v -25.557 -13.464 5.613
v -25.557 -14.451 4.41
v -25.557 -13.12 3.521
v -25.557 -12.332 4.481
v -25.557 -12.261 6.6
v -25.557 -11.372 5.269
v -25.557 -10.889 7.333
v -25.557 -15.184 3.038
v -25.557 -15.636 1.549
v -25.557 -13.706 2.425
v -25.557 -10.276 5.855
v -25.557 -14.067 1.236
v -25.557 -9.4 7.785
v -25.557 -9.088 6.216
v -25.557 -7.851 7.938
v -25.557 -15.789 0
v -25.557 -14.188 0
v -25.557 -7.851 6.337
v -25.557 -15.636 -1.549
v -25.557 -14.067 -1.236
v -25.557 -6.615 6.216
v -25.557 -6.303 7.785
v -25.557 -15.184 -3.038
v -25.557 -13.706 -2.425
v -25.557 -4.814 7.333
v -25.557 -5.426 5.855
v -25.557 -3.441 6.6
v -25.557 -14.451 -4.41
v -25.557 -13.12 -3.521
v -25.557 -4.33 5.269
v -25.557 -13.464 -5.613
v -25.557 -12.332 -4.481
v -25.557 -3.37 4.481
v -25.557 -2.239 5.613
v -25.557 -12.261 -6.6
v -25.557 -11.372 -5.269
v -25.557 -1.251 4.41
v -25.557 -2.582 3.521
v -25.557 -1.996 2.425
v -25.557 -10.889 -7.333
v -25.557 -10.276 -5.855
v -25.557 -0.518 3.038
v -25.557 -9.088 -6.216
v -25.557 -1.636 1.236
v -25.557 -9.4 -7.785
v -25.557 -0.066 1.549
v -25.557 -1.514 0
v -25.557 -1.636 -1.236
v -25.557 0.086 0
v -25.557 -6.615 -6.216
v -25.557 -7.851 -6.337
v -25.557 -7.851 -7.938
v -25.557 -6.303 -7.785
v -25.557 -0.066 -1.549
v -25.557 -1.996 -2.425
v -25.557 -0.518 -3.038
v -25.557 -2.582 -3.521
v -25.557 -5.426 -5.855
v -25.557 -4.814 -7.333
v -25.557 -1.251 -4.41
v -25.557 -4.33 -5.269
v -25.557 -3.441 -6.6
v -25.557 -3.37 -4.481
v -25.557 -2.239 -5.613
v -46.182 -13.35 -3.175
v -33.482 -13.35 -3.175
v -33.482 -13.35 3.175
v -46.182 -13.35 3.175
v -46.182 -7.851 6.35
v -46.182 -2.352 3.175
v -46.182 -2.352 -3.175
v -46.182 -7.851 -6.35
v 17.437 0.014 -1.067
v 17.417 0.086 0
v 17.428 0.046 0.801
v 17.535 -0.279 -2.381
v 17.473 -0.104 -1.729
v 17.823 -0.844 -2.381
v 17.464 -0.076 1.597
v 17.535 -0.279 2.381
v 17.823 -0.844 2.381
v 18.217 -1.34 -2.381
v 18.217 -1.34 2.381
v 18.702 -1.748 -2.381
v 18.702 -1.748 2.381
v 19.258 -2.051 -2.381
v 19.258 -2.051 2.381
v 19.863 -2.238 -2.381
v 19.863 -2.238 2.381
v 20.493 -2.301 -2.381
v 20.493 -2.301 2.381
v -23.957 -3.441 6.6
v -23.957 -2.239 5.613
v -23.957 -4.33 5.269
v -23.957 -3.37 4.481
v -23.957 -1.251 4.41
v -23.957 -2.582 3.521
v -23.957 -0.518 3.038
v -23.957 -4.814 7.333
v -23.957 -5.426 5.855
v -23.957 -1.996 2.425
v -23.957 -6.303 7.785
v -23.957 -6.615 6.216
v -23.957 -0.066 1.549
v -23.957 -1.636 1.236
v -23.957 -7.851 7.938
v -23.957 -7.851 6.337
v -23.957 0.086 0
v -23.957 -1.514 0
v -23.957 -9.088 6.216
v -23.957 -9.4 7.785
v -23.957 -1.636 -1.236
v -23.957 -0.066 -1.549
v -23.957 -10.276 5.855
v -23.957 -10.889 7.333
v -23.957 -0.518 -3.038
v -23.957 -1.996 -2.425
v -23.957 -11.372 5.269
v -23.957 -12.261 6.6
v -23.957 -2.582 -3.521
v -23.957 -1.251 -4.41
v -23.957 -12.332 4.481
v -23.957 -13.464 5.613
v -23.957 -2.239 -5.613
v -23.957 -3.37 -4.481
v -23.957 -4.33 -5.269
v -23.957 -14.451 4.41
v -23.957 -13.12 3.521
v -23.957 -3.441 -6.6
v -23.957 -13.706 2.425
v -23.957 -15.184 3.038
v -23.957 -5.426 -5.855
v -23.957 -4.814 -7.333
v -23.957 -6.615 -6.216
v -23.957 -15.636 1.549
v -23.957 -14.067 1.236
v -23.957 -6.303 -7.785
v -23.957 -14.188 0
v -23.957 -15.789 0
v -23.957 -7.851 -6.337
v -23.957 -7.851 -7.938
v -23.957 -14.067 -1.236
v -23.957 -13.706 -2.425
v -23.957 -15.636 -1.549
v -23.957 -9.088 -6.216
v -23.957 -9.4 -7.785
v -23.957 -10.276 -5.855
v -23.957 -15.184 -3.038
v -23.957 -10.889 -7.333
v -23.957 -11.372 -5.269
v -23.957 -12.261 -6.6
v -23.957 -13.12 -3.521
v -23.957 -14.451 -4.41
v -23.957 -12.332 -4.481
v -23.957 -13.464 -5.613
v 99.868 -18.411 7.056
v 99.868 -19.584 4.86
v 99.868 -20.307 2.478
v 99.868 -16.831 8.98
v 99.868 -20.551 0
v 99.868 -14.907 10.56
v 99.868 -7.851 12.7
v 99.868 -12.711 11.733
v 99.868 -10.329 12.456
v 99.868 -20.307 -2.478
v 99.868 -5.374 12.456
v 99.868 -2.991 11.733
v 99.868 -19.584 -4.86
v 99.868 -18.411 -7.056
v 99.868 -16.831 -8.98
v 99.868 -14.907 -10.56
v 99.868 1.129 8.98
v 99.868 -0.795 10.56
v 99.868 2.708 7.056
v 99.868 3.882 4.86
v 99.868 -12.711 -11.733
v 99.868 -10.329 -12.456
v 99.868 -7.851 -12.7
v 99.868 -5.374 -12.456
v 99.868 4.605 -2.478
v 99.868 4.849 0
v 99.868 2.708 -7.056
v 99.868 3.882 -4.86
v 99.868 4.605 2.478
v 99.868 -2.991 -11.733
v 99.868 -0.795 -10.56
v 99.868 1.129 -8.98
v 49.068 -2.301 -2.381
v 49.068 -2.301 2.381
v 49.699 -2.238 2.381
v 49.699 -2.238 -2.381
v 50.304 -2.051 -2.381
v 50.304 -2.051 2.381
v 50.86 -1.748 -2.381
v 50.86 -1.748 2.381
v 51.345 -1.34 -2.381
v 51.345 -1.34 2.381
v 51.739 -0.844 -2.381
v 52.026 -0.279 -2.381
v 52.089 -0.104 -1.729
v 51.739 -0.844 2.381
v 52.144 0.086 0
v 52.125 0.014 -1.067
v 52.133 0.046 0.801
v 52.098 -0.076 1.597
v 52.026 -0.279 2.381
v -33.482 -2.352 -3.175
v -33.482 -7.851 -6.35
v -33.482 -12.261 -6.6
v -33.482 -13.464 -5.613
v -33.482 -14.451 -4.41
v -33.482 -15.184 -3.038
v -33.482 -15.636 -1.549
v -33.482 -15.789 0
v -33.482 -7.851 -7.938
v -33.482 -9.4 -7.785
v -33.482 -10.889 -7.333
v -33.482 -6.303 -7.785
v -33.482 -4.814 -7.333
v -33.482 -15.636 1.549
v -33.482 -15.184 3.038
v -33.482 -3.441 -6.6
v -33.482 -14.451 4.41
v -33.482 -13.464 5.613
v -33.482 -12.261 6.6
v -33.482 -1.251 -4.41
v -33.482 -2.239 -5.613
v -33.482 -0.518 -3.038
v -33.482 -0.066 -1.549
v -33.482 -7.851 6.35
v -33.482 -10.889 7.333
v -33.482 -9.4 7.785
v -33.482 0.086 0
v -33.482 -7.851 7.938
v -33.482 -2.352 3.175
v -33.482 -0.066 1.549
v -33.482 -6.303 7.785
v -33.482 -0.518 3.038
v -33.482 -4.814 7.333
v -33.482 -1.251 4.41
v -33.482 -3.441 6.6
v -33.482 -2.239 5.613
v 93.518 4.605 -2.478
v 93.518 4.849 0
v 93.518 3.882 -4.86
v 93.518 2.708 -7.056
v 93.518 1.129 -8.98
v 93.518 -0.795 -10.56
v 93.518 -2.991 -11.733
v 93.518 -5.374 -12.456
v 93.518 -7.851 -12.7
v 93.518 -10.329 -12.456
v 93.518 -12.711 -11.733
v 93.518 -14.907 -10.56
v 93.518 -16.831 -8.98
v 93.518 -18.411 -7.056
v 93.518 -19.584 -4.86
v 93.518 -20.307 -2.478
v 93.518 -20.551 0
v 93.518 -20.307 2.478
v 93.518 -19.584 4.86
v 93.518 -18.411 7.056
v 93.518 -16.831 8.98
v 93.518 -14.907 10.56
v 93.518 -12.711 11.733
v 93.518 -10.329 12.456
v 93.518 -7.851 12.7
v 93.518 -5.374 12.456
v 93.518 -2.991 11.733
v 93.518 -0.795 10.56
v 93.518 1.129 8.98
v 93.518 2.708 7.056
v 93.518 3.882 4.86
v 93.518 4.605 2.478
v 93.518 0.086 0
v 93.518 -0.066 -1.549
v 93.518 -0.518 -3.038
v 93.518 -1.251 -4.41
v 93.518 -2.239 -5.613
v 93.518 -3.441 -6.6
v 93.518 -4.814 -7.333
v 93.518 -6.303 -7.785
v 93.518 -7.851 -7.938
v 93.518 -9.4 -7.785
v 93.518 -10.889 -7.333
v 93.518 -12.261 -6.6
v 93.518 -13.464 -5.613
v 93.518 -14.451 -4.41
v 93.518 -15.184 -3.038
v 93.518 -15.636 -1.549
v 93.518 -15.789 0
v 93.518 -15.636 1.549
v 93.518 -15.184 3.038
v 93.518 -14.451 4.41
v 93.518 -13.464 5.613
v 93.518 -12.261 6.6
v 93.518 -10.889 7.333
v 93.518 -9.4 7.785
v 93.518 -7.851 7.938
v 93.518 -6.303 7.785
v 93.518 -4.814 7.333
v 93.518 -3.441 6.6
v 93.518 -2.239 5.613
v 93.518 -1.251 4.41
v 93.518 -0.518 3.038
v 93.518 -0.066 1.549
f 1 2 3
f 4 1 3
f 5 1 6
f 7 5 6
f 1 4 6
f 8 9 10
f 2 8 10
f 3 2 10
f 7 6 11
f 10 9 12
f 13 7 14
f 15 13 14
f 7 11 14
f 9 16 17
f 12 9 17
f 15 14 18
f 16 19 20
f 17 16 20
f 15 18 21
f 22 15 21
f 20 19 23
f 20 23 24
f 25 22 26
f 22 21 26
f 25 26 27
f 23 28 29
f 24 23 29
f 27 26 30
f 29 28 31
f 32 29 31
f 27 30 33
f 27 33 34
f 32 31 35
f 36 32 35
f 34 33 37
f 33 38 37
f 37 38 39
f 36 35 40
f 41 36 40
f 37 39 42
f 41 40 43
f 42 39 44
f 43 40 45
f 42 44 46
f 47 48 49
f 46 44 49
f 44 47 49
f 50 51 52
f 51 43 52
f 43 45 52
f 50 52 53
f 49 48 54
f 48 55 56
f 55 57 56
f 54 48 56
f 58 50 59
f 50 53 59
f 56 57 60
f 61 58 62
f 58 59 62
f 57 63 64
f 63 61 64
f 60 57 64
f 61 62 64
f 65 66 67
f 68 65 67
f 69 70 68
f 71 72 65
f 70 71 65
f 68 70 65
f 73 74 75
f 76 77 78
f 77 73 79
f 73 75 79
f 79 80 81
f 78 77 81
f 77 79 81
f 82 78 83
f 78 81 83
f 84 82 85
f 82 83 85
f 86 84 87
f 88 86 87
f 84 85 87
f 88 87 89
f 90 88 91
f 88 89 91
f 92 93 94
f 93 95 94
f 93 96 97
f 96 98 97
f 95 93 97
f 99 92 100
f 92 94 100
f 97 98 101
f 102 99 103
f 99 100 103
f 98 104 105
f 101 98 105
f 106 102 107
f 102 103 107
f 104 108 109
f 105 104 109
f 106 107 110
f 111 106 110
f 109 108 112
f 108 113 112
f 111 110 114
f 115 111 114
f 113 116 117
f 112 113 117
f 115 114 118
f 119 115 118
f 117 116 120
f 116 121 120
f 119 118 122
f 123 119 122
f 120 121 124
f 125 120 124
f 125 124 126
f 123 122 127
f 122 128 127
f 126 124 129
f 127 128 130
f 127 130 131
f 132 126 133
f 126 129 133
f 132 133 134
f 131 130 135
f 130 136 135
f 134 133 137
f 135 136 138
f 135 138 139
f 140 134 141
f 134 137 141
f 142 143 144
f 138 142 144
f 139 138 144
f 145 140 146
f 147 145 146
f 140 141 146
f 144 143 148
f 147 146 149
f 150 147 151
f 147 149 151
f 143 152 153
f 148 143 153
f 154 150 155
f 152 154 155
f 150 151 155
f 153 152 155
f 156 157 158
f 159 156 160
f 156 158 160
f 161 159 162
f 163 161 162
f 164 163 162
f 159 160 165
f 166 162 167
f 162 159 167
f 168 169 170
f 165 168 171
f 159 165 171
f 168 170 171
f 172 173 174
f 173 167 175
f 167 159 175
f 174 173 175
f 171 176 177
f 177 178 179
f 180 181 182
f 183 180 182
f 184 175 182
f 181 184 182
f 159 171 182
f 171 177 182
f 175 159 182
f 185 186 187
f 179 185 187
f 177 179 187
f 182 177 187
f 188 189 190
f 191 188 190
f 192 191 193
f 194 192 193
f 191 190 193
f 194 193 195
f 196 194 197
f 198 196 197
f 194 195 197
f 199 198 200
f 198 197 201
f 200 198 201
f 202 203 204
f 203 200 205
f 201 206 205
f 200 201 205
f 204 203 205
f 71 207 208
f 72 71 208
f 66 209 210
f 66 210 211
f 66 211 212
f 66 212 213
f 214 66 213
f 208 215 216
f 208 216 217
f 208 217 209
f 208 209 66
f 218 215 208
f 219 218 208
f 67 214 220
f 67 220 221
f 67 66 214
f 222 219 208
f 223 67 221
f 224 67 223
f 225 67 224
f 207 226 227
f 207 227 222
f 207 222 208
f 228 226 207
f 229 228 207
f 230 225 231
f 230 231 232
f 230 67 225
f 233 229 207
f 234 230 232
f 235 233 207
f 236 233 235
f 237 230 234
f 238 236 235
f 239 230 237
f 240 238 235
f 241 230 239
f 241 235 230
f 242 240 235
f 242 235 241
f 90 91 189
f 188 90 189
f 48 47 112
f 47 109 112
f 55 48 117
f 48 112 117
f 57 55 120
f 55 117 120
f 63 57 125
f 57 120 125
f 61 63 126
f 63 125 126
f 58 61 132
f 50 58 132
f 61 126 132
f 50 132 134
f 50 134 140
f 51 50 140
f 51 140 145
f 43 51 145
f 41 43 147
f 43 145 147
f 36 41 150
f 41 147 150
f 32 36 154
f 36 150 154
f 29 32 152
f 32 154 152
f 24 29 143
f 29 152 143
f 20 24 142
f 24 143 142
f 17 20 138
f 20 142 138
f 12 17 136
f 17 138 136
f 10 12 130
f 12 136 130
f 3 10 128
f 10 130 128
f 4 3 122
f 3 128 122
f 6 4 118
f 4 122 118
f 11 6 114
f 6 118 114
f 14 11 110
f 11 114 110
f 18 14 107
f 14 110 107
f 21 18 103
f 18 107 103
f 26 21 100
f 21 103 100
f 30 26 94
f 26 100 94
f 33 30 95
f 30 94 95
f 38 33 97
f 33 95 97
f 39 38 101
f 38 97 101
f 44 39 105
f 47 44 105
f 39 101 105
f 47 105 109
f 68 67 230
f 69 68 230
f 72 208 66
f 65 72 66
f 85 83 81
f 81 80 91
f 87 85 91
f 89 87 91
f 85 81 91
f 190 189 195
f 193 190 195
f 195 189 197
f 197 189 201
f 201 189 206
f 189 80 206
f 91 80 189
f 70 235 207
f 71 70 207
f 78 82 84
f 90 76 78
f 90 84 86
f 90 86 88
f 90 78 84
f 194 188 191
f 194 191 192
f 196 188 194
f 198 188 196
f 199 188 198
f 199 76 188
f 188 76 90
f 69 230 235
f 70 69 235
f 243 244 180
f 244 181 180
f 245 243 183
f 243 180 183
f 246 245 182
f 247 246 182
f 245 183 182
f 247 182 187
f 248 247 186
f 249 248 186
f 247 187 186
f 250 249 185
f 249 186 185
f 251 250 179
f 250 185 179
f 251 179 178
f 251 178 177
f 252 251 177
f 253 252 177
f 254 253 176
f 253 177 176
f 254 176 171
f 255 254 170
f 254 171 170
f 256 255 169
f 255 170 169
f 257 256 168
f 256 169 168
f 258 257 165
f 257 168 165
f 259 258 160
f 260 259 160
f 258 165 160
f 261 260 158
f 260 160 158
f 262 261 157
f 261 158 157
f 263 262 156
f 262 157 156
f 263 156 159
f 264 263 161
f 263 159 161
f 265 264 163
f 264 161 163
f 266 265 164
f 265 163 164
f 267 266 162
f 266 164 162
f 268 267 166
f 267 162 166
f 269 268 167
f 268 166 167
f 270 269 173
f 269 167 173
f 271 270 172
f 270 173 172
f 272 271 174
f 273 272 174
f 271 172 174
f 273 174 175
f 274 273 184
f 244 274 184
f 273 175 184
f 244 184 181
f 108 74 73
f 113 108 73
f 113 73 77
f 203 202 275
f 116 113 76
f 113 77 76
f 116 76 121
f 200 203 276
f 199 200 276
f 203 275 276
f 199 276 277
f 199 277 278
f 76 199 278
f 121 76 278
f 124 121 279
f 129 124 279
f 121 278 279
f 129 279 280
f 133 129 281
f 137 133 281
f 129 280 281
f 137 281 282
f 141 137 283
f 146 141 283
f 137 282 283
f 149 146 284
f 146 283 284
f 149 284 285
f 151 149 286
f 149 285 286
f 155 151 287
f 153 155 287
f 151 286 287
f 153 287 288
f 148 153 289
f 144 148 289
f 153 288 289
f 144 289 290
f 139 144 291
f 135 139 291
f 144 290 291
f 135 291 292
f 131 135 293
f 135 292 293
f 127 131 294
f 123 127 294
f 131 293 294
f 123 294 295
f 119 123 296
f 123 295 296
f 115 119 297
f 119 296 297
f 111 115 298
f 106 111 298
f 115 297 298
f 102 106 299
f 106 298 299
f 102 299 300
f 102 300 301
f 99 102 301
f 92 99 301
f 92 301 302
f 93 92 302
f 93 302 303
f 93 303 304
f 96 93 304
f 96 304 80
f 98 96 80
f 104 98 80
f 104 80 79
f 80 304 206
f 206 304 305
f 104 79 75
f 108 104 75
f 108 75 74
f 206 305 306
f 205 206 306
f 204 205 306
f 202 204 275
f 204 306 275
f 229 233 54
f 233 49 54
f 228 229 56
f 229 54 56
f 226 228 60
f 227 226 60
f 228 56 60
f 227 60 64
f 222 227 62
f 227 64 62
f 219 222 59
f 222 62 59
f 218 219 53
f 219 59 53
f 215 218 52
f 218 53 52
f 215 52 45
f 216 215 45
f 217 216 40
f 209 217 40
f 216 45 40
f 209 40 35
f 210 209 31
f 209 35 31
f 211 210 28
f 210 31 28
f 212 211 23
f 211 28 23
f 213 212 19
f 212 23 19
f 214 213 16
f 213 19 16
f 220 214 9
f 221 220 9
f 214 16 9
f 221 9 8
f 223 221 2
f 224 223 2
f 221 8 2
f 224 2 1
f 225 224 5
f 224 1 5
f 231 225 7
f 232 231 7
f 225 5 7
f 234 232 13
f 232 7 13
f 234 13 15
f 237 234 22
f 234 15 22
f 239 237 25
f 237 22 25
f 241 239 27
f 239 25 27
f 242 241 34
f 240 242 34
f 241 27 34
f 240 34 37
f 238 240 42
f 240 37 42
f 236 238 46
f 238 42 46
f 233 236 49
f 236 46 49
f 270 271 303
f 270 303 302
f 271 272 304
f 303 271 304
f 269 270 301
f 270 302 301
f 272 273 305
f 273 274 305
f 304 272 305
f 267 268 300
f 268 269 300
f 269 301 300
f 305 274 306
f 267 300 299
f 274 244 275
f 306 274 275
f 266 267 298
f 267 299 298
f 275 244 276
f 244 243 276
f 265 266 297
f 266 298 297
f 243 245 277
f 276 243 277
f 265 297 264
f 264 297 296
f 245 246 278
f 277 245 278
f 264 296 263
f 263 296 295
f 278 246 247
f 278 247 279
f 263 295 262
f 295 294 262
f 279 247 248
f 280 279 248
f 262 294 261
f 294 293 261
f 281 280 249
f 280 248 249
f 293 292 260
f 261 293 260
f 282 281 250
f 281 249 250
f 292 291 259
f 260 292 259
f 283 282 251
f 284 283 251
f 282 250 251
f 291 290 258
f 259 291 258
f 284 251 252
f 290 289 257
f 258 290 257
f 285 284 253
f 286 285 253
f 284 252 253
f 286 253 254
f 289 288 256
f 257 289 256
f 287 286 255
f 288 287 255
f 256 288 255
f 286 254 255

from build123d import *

# Parameters (mm, degrees)
CUT_EXTRUDE1_DEPTH = 2.38125
SKETCH3_OUTSIDE_W  = 57.48
SKETCH3_OUTSIDE_H  = 57.48
CUT_EXTRUDE2_DEPTH = 12.7


with BuildPart() as part:
    # Sketch1 → Revolve1 (revolve)
    with BuildSketch(Plane.XY):
        Polygon((-46.181818182, -7.851196491), (-46.181818182, -1.501196491), (-33.481818182, -1.501196491), (-33.481818182, 0.086303509), (-25.557018182, 0.086303509), (-25.557018182, -1.513896491), (-23.956818182, -1.513896491), (-23.956818182, 0.086303509), (93.518181818, 0.086303509), (93.518181818, 4.848803509), (99.868181818, 4.848803509), (99.868181818, -7.851196491), align=None)
    revolve(axis=Axis((-46.181818182, -7.851196491, 0), (-1, 0, 0)))

    # Sketch2 → Cut-Extrude1 (cut, symmetric)
    with BuildSketch(Plane.XY):
        with BuildLine():
            Line((17.318181818, 5.781363923), (17.318181818, 0.873703509))
            ThreePointArc((17.318181818, 0.873703509), (18.248117788, -1.371360522), (20.493181818, -2.301296491))
            Line((20.493181818, -2.301296491), (49.068181818, -2.301296491))
            ThreePointArc((49.068181818, -2.301296491), (51.313245848, -1.371360522), (52.243181818, 0.873703509))
            Line((52.243181818, 0.873703509), (52.243181818, 5.781363923))
            Line((52.243181818, 5.781363923), (17.318181818, 5.781363923))
        make_face()
    extrude(amount=CUT_EXTRUDE1_DEPTH, both=True, mode=Mode.SUBTRACT)

    # Sketch3 outside → Cut-Extrude2 (cut)
    with BuildSketch(Plane.ZY.offset(46.181818182)):
        with Locations((0, -7.851)):
            Rectangle(SKETCH3_OUTSIDE_W, SKETCH3_OUTSIDE_H)
        Polygon((6.35, -7.851196491), (3.175, -2.351935177), (-3.175, -2.351935177), (-6.35, -7.851196491), (-3.175, -13.350457805), (3.175, -13.350457805), align=None, mode=Mode.SUBTRACT)
    extrude(amount=-CUT_EXTRUDE2_DEPTH, mode=Mode.SUBTRACT)


solid = part.part
